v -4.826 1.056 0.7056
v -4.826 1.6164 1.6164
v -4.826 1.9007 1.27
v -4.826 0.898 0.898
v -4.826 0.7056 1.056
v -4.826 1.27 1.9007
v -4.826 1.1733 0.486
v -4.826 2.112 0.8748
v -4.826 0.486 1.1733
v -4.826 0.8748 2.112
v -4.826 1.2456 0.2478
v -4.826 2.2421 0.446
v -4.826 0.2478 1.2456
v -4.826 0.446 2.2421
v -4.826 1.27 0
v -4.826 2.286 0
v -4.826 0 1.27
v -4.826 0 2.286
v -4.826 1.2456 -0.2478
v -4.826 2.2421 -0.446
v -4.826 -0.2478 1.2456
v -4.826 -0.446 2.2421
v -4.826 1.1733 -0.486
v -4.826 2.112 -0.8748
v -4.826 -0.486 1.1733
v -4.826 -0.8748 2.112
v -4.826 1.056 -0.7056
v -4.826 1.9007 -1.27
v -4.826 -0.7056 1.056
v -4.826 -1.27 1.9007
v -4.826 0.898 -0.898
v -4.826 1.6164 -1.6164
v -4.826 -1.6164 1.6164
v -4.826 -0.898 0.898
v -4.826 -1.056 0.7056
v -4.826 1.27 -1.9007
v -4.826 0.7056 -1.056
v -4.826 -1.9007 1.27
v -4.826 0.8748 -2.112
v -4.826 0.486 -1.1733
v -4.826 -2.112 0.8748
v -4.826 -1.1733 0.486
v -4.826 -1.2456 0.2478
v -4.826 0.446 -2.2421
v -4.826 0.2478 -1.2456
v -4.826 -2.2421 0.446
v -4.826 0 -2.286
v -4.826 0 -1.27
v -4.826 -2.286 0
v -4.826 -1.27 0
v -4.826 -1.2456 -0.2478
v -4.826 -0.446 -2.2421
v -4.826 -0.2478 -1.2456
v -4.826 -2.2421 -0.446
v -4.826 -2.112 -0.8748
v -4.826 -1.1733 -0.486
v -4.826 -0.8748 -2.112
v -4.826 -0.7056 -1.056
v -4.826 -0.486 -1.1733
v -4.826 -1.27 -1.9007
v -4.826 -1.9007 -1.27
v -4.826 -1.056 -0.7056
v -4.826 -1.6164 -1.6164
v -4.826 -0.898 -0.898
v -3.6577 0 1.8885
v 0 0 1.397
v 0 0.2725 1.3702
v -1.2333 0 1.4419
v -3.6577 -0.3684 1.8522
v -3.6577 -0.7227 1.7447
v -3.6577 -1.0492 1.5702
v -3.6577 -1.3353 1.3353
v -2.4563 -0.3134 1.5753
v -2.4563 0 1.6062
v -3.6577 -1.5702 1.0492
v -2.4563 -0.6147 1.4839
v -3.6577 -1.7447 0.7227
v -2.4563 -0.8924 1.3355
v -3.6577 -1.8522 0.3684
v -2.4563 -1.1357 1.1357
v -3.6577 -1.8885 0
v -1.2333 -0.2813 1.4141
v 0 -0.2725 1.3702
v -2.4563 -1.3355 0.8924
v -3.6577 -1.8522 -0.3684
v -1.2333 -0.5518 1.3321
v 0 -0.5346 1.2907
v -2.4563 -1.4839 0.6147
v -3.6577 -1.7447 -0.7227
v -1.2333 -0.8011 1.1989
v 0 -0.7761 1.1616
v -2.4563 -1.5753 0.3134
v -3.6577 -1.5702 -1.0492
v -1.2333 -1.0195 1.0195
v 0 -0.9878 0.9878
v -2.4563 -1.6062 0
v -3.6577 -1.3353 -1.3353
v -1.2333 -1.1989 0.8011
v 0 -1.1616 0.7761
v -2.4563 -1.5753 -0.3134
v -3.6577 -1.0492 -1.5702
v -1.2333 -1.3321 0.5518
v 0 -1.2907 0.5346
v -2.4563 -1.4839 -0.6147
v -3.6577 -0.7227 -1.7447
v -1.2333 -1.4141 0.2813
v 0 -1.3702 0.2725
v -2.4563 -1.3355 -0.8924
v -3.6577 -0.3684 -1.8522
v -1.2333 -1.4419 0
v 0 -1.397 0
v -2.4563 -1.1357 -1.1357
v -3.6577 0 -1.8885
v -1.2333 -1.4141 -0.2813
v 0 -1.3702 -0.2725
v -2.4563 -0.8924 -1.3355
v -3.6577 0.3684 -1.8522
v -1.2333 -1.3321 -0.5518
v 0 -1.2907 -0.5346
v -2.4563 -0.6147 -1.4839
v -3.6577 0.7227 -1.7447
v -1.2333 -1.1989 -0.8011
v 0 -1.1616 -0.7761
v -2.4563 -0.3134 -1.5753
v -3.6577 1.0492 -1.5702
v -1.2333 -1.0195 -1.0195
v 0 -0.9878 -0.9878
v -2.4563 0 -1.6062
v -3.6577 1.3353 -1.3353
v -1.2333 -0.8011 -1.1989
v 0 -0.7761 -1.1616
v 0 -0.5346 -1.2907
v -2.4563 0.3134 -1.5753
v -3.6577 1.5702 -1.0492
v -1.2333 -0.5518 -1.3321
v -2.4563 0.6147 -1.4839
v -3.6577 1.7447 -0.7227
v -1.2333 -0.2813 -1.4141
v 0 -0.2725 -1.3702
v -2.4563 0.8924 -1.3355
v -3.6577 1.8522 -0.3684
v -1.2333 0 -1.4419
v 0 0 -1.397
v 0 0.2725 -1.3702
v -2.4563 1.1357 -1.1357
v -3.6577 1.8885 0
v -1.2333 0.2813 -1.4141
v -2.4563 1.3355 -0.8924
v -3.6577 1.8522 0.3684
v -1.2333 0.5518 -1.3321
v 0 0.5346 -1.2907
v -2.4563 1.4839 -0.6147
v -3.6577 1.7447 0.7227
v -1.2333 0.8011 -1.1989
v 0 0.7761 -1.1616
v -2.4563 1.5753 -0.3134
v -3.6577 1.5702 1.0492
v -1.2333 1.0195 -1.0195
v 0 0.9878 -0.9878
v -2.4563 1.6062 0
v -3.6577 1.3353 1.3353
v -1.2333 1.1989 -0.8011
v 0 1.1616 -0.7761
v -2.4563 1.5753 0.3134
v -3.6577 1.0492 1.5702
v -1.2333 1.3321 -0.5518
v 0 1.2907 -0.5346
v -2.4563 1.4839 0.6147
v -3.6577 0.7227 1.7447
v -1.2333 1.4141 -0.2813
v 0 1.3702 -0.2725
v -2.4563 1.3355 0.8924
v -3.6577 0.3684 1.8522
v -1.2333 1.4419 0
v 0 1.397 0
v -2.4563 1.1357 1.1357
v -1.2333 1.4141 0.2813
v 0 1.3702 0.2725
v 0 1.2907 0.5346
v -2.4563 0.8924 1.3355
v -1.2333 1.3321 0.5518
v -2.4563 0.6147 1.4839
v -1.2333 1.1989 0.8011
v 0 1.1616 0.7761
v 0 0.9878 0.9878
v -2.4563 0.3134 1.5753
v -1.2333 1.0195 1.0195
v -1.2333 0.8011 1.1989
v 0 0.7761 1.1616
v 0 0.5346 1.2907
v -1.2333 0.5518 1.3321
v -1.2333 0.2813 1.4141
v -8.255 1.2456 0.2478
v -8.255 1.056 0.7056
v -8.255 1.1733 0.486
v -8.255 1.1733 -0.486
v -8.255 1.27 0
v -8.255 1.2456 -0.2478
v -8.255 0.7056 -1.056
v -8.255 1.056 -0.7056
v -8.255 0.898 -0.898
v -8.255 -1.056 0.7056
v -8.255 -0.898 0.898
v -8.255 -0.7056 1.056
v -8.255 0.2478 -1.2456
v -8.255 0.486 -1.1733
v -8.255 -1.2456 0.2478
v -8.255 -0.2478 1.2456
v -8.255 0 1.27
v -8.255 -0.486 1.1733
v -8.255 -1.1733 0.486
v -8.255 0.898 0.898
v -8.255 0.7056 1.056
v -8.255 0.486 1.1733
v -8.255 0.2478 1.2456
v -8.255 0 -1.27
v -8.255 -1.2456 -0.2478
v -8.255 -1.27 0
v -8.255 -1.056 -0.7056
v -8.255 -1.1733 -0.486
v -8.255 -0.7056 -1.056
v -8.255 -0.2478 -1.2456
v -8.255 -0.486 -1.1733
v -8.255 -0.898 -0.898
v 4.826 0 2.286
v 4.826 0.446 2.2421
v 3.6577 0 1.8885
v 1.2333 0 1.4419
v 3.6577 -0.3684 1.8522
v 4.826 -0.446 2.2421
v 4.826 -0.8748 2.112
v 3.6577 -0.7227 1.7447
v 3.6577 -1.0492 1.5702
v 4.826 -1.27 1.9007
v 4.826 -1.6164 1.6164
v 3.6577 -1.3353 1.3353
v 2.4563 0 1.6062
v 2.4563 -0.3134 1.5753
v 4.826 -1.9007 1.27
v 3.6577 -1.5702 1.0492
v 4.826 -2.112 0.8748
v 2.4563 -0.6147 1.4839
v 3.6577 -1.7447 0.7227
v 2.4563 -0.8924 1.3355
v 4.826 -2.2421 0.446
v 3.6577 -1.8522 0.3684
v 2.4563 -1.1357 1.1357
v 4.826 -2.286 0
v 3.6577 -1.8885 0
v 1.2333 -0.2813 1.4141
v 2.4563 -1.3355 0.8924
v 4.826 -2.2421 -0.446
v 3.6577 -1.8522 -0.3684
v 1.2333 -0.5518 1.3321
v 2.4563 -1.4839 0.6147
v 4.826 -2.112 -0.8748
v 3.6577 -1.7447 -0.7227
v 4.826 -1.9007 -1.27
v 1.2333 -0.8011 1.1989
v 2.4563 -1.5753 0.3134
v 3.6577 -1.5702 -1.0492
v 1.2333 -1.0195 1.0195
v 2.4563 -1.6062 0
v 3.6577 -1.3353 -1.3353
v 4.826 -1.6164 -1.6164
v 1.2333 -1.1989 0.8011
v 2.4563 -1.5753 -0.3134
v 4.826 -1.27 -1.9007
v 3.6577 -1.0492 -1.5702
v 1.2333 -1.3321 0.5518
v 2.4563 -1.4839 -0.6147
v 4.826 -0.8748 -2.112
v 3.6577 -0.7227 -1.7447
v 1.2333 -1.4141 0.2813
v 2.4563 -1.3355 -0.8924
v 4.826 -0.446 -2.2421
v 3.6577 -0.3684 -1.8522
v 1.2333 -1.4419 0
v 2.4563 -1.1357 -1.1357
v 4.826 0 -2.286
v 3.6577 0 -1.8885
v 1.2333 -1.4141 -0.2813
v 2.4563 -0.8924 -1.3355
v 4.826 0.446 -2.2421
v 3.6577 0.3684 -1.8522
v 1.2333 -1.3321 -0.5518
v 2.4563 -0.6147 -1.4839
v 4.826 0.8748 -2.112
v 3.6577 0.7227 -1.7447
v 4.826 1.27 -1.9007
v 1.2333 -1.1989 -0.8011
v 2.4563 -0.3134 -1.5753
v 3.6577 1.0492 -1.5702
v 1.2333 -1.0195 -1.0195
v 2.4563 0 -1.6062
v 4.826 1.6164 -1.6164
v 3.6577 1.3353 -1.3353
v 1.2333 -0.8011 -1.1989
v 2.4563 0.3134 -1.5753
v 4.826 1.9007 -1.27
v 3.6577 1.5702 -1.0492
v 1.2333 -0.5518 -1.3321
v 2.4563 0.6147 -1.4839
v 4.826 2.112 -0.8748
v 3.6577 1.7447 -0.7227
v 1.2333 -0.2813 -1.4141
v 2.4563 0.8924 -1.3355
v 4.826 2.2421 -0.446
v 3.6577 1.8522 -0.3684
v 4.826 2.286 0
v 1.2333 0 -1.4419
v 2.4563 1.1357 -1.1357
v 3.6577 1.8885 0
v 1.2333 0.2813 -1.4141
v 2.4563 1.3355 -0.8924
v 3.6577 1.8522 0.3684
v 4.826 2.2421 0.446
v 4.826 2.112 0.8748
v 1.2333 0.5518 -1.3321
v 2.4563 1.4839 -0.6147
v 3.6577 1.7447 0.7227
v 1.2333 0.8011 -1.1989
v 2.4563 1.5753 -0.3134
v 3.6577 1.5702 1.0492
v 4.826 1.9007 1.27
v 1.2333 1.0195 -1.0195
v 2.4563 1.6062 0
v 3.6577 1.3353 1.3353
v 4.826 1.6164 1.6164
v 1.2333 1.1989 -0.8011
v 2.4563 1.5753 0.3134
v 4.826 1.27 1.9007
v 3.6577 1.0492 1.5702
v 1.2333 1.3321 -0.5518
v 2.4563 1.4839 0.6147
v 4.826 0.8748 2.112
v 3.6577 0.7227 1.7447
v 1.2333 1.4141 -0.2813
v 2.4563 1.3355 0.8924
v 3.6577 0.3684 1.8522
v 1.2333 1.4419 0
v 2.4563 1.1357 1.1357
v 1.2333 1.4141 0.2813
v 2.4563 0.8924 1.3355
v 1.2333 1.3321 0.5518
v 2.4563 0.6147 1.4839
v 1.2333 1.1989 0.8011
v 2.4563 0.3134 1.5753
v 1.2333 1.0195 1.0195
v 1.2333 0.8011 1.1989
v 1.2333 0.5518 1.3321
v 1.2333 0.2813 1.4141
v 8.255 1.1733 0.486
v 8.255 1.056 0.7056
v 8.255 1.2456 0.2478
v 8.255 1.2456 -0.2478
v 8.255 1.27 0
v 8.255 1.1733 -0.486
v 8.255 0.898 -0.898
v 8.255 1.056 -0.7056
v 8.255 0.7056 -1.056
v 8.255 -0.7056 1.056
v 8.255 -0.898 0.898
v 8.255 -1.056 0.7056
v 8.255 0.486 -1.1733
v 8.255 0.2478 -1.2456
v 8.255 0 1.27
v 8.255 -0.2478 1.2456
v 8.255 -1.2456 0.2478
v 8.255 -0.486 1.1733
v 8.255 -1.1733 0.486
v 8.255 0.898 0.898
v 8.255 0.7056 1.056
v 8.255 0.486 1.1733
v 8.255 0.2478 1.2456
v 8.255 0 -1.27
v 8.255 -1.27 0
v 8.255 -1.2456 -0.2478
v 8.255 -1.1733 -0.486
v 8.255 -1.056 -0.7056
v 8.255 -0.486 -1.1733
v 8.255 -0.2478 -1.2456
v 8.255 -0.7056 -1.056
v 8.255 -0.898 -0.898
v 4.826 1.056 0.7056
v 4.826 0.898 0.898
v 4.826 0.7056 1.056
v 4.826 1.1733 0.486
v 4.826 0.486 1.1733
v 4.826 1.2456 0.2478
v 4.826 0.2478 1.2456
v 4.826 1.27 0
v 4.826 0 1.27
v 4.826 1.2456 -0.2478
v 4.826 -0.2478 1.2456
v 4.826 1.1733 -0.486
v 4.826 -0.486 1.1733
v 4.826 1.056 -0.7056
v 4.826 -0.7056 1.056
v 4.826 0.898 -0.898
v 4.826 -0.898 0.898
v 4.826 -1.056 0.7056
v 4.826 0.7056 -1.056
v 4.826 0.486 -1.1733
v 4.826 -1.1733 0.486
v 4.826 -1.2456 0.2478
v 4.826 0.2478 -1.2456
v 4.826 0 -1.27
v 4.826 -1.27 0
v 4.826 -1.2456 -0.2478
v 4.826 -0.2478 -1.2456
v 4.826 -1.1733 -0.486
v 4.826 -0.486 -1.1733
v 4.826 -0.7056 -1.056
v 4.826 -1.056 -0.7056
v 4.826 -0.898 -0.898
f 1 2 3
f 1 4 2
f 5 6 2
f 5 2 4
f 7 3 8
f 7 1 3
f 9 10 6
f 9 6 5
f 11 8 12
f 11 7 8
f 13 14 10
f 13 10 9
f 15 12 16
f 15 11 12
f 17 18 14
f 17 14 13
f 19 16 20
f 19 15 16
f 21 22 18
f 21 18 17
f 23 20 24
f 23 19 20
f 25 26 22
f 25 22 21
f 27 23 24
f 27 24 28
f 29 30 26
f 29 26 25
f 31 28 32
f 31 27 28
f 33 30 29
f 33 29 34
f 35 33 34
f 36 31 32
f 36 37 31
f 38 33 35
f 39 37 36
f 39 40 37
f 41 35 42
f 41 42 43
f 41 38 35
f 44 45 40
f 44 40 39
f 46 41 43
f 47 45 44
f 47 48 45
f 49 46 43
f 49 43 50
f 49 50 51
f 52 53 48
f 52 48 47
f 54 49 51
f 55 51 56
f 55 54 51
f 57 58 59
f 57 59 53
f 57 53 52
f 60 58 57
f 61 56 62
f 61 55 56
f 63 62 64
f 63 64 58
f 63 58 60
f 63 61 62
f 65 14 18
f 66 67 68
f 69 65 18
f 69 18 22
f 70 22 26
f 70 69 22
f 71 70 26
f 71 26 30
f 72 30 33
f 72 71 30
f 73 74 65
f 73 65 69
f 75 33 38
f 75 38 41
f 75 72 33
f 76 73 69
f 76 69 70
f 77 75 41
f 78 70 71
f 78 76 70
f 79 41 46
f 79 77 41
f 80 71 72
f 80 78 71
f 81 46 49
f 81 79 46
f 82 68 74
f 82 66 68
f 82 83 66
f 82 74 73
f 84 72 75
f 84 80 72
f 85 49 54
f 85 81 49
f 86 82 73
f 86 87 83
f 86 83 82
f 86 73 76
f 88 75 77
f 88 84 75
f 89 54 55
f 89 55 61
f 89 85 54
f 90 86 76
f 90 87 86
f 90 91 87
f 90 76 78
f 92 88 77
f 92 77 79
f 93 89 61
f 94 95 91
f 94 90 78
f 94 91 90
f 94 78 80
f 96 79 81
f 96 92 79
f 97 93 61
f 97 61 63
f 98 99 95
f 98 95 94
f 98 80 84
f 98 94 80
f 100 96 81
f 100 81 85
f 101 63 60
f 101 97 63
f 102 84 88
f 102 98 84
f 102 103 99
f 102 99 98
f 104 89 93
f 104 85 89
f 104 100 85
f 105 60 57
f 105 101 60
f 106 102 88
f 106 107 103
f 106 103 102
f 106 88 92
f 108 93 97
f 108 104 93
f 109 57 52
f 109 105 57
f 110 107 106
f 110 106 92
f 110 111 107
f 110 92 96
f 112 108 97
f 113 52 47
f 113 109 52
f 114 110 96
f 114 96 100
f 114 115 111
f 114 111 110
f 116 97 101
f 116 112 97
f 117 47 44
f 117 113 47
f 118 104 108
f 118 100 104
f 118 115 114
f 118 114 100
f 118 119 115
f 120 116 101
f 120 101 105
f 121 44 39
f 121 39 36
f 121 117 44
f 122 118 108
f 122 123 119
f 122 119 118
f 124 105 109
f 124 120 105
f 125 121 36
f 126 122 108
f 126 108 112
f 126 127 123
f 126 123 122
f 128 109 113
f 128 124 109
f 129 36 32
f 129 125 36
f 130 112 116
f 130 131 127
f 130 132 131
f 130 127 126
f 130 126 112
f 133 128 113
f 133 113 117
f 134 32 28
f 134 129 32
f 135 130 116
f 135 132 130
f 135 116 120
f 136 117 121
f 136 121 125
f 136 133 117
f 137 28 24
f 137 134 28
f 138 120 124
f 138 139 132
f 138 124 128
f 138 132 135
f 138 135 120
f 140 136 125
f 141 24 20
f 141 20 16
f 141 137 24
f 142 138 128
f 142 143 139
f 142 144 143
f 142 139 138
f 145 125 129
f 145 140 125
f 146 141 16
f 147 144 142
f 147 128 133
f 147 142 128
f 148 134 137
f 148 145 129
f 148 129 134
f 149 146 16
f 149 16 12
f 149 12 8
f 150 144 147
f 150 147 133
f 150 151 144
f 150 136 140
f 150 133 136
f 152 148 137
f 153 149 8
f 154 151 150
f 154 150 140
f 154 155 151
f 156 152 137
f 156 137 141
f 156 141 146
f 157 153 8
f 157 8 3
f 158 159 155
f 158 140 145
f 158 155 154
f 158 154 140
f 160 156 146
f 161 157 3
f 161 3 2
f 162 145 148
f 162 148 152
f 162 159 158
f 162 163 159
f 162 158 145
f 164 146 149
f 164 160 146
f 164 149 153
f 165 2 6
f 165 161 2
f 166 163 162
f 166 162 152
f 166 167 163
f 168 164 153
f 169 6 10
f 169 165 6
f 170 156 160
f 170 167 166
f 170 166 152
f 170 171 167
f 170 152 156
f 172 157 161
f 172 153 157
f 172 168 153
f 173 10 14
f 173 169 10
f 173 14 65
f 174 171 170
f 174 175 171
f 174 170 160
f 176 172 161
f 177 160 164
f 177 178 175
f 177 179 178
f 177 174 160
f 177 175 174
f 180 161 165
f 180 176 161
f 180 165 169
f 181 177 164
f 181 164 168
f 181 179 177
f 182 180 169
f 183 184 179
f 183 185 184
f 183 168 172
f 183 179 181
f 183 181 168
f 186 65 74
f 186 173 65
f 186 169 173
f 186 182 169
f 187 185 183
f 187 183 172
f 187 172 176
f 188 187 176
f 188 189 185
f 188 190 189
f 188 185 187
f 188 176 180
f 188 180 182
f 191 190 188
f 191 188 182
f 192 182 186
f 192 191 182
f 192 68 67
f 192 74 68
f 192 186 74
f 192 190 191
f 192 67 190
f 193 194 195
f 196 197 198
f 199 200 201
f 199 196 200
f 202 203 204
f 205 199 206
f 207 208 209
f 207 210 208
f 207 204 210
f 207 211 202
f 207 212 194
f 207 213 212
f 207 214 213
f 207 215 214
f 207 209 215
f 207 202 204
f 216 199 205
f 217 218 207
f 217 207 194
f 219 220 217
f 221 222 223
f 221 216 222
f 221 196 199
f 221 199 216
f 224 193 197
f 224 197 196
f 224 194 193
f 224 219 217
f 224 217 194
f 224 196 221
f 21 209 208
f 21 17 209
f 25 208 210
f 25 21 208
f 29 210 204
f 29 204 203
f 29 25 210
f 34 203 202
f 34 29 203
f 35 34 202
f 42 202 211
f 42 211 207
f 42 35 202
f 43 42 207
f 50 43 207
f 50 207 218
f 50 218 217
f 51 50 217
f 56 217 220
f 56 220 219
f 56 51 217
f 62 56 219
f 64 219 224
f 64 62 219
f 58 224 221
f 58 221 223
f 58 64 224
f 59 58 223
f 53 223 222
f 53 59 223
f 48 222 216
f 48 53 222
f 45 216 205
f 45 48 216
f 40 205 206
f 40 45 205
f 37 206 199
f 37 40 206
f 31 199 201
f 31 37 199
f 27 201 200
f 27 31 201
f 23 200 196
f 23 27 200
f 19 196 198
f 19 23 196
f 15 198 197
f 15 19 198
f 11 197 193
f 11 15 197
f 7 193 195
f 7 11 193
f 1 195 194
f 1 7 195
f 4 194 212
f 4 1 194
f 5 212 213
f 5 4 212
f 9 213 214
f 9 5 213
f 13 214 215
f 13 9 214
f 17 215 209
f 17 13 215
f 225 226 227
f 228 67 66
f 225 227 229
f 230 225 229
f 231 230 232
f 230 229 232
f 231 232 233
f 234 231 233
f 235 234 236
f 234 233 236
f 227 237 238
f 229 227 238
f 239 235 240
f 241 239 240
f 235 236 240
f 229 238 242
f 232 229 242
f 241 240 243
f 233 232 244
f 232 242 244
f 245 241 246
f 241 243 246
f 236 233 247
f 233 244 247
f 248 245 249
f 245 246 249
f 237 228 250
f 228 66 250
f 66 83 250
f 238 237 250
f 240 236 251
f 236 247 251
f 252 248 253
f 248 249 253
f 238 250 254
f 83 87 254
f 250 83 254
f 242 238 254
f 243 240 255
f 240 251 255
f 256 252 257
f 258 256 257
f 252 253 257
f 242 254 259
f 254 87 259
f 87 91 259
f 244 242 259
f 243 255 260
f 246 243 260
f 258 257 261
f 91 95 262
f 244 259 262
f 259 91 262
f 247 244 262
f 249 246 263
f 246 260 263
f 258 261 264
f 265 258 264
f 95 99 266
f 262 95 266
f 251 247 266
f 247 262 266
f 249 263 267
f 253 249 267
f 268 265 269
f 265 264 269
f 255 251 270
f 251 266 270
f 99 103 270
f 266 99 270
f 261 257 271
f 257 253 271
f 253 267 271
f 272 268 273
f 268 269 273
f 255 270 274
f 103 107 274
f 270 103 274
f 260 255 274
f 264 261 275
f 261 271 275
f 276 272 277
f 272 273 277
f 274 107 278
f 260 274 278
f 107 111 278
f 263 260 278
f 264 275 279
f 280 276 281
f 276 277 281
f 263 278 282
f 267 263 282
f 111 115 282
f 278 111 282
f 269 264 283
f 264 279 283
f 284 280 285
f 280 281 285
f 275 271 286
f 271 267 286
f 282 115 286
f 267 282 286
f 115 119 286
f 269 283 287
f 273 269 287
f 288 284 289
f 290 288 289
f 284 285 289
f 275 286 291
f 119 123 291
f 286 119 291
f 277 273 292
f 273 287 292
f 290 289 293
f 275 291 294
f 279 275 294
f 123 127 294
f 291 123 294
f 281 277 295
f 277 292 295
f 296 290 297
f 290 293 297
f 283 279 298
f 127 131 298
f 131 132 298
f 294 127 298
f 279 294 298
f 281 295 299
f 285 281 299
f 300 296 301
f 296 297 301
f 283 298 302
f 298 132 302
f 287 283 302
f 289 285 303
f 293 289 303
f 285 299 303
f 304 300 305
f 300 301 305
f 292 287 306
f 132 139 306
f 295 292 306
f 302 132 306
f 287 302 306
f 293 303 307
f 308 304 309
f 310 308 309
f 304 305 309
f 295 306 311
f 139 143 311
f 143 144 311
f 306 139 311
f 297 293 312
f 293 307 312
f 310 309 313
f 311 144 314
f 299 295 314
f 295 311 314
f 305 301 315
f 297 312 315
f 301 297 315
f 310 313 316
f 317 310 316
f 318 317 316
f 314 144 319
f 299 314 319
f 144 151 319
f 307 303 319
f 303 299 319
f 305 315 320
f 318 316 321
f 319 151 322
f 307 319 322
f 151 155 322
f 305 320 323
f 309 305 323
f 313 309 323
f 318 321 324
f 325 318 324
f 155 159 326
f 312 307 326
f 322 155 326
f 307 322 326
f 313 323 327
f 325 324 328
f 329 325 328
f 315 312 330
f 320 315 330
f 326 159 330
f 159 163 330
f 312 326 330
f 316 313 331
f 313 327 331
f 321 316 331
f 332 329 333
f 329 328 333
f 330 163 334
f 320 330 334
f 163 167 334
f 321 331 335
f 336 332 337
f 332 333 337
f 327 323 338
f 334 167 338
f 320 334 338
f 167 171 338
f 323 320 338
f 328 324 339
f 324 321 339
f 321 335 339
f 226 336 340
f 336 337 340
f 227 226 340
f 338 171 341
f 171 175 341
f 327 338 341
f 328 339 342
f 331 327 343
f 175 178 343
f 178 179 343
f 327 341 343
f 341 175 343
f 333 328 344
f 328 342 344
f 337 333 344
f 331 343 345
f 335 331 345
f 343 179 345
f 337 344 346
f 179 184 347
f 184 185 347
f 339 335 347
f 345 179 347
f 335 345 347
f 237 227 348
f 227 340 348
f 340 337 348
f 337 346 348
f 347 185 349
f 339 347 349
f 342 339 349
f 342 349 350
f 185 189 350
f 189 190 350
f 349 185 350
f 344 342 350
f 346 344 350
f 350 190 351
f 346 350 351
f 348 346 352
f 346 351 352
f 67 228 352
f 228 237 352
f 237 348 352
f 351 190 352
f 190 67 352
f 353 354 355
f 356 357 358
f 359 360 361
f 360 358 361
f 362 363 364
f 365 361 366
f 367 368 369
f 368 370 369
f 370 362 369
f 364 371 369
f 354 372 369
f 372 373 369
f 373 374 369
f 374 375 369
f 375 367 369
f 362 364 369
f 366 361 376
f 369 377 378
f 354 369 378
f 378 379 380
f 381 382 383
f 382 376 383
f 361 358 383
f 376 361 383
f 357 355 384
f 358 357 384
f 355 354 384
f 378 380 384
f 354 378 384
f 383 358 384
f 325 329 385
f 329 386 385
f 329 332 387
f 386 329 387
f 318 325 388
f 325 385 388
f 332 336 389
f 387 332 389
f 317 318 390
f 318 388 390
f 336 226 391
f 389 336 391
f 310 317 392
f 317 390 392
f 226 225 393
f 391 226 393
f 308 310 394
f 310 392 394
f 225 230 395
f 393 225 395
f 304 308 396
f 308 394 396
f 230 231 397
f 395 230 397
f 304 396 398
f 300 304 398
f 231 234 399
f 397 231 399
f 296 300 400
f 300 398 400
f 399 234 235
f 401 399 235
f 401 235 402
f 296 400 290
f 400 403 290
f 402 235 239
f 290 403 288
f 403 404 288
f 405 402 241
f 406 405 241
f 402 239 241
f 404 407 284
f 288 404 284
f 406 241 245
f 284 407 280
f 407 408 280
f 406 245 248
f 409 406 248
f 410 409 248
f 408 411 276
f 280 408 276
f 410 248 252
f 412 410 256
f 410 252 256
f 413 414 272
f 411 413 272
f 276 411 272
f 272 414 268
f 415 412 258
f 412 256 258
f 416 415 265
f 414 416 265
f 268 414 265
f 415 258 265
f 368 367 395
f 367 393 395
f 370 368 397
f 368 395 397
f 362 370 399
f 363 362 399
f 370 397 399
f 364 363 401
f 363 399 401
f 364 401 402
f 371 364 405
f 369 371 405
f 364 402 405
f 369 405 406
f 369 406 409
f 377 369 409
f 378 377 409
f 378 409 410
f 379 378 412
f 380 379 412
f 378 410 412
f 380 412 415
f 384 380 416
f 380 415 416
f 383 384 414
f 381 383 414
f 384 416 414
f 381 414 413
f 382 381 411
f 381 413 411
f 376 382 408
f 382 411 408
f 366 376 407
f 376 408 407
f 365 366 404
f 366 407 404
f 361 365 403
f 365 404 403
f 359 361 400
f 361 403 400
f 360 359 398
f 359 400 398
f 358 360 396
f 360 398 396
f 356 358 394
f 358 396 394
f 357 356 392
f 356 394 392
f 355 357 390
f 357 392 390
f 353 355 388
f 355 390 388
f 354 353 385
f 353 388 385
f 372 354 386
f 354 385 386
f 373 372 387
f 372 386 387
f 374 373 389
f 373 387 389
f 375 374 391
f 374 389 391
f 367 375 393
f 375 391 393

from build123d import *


with BuildPart() as part:
    # Sketch1 → Revolve1 (revolve)
    with BuildSketch(Plane(origin=(0, 0, 0), x_dir=(1, 0, 0), z_dir=(0, 1, 0)), mode=Mode.PRIVATE) as revolve1_sk:
        with BuildLine():
            Line((0, 0), (8.255, 0))
            Line((8.255, 0), (8.255, 1.27))
            Line((8.255, 1.27), (4.826, 1.27))
            Line((4.826, 1.27), (4.826, 2.286))
            ThreePointArc((4.826, 2.286), (2.456346308, 1.606191469), (0, 1.397))
            Line((0, 1.397), (0, 0))
        make_face()
    revolve1 = revolve(revolve1_sk.sketch.rotate(Axis((0, 0, 0), (1, 0, 0)), 180), axis=Axis((0, 0, 0), (1, 0, 0)))

    # Mirror1: Revolve1 across plane
    add(revolve1.mirror(Plane(origin=(0, 0, 0), x_dir=(0, 0, 1), z_dir=(1, 0, 0))))


solid = part.part
